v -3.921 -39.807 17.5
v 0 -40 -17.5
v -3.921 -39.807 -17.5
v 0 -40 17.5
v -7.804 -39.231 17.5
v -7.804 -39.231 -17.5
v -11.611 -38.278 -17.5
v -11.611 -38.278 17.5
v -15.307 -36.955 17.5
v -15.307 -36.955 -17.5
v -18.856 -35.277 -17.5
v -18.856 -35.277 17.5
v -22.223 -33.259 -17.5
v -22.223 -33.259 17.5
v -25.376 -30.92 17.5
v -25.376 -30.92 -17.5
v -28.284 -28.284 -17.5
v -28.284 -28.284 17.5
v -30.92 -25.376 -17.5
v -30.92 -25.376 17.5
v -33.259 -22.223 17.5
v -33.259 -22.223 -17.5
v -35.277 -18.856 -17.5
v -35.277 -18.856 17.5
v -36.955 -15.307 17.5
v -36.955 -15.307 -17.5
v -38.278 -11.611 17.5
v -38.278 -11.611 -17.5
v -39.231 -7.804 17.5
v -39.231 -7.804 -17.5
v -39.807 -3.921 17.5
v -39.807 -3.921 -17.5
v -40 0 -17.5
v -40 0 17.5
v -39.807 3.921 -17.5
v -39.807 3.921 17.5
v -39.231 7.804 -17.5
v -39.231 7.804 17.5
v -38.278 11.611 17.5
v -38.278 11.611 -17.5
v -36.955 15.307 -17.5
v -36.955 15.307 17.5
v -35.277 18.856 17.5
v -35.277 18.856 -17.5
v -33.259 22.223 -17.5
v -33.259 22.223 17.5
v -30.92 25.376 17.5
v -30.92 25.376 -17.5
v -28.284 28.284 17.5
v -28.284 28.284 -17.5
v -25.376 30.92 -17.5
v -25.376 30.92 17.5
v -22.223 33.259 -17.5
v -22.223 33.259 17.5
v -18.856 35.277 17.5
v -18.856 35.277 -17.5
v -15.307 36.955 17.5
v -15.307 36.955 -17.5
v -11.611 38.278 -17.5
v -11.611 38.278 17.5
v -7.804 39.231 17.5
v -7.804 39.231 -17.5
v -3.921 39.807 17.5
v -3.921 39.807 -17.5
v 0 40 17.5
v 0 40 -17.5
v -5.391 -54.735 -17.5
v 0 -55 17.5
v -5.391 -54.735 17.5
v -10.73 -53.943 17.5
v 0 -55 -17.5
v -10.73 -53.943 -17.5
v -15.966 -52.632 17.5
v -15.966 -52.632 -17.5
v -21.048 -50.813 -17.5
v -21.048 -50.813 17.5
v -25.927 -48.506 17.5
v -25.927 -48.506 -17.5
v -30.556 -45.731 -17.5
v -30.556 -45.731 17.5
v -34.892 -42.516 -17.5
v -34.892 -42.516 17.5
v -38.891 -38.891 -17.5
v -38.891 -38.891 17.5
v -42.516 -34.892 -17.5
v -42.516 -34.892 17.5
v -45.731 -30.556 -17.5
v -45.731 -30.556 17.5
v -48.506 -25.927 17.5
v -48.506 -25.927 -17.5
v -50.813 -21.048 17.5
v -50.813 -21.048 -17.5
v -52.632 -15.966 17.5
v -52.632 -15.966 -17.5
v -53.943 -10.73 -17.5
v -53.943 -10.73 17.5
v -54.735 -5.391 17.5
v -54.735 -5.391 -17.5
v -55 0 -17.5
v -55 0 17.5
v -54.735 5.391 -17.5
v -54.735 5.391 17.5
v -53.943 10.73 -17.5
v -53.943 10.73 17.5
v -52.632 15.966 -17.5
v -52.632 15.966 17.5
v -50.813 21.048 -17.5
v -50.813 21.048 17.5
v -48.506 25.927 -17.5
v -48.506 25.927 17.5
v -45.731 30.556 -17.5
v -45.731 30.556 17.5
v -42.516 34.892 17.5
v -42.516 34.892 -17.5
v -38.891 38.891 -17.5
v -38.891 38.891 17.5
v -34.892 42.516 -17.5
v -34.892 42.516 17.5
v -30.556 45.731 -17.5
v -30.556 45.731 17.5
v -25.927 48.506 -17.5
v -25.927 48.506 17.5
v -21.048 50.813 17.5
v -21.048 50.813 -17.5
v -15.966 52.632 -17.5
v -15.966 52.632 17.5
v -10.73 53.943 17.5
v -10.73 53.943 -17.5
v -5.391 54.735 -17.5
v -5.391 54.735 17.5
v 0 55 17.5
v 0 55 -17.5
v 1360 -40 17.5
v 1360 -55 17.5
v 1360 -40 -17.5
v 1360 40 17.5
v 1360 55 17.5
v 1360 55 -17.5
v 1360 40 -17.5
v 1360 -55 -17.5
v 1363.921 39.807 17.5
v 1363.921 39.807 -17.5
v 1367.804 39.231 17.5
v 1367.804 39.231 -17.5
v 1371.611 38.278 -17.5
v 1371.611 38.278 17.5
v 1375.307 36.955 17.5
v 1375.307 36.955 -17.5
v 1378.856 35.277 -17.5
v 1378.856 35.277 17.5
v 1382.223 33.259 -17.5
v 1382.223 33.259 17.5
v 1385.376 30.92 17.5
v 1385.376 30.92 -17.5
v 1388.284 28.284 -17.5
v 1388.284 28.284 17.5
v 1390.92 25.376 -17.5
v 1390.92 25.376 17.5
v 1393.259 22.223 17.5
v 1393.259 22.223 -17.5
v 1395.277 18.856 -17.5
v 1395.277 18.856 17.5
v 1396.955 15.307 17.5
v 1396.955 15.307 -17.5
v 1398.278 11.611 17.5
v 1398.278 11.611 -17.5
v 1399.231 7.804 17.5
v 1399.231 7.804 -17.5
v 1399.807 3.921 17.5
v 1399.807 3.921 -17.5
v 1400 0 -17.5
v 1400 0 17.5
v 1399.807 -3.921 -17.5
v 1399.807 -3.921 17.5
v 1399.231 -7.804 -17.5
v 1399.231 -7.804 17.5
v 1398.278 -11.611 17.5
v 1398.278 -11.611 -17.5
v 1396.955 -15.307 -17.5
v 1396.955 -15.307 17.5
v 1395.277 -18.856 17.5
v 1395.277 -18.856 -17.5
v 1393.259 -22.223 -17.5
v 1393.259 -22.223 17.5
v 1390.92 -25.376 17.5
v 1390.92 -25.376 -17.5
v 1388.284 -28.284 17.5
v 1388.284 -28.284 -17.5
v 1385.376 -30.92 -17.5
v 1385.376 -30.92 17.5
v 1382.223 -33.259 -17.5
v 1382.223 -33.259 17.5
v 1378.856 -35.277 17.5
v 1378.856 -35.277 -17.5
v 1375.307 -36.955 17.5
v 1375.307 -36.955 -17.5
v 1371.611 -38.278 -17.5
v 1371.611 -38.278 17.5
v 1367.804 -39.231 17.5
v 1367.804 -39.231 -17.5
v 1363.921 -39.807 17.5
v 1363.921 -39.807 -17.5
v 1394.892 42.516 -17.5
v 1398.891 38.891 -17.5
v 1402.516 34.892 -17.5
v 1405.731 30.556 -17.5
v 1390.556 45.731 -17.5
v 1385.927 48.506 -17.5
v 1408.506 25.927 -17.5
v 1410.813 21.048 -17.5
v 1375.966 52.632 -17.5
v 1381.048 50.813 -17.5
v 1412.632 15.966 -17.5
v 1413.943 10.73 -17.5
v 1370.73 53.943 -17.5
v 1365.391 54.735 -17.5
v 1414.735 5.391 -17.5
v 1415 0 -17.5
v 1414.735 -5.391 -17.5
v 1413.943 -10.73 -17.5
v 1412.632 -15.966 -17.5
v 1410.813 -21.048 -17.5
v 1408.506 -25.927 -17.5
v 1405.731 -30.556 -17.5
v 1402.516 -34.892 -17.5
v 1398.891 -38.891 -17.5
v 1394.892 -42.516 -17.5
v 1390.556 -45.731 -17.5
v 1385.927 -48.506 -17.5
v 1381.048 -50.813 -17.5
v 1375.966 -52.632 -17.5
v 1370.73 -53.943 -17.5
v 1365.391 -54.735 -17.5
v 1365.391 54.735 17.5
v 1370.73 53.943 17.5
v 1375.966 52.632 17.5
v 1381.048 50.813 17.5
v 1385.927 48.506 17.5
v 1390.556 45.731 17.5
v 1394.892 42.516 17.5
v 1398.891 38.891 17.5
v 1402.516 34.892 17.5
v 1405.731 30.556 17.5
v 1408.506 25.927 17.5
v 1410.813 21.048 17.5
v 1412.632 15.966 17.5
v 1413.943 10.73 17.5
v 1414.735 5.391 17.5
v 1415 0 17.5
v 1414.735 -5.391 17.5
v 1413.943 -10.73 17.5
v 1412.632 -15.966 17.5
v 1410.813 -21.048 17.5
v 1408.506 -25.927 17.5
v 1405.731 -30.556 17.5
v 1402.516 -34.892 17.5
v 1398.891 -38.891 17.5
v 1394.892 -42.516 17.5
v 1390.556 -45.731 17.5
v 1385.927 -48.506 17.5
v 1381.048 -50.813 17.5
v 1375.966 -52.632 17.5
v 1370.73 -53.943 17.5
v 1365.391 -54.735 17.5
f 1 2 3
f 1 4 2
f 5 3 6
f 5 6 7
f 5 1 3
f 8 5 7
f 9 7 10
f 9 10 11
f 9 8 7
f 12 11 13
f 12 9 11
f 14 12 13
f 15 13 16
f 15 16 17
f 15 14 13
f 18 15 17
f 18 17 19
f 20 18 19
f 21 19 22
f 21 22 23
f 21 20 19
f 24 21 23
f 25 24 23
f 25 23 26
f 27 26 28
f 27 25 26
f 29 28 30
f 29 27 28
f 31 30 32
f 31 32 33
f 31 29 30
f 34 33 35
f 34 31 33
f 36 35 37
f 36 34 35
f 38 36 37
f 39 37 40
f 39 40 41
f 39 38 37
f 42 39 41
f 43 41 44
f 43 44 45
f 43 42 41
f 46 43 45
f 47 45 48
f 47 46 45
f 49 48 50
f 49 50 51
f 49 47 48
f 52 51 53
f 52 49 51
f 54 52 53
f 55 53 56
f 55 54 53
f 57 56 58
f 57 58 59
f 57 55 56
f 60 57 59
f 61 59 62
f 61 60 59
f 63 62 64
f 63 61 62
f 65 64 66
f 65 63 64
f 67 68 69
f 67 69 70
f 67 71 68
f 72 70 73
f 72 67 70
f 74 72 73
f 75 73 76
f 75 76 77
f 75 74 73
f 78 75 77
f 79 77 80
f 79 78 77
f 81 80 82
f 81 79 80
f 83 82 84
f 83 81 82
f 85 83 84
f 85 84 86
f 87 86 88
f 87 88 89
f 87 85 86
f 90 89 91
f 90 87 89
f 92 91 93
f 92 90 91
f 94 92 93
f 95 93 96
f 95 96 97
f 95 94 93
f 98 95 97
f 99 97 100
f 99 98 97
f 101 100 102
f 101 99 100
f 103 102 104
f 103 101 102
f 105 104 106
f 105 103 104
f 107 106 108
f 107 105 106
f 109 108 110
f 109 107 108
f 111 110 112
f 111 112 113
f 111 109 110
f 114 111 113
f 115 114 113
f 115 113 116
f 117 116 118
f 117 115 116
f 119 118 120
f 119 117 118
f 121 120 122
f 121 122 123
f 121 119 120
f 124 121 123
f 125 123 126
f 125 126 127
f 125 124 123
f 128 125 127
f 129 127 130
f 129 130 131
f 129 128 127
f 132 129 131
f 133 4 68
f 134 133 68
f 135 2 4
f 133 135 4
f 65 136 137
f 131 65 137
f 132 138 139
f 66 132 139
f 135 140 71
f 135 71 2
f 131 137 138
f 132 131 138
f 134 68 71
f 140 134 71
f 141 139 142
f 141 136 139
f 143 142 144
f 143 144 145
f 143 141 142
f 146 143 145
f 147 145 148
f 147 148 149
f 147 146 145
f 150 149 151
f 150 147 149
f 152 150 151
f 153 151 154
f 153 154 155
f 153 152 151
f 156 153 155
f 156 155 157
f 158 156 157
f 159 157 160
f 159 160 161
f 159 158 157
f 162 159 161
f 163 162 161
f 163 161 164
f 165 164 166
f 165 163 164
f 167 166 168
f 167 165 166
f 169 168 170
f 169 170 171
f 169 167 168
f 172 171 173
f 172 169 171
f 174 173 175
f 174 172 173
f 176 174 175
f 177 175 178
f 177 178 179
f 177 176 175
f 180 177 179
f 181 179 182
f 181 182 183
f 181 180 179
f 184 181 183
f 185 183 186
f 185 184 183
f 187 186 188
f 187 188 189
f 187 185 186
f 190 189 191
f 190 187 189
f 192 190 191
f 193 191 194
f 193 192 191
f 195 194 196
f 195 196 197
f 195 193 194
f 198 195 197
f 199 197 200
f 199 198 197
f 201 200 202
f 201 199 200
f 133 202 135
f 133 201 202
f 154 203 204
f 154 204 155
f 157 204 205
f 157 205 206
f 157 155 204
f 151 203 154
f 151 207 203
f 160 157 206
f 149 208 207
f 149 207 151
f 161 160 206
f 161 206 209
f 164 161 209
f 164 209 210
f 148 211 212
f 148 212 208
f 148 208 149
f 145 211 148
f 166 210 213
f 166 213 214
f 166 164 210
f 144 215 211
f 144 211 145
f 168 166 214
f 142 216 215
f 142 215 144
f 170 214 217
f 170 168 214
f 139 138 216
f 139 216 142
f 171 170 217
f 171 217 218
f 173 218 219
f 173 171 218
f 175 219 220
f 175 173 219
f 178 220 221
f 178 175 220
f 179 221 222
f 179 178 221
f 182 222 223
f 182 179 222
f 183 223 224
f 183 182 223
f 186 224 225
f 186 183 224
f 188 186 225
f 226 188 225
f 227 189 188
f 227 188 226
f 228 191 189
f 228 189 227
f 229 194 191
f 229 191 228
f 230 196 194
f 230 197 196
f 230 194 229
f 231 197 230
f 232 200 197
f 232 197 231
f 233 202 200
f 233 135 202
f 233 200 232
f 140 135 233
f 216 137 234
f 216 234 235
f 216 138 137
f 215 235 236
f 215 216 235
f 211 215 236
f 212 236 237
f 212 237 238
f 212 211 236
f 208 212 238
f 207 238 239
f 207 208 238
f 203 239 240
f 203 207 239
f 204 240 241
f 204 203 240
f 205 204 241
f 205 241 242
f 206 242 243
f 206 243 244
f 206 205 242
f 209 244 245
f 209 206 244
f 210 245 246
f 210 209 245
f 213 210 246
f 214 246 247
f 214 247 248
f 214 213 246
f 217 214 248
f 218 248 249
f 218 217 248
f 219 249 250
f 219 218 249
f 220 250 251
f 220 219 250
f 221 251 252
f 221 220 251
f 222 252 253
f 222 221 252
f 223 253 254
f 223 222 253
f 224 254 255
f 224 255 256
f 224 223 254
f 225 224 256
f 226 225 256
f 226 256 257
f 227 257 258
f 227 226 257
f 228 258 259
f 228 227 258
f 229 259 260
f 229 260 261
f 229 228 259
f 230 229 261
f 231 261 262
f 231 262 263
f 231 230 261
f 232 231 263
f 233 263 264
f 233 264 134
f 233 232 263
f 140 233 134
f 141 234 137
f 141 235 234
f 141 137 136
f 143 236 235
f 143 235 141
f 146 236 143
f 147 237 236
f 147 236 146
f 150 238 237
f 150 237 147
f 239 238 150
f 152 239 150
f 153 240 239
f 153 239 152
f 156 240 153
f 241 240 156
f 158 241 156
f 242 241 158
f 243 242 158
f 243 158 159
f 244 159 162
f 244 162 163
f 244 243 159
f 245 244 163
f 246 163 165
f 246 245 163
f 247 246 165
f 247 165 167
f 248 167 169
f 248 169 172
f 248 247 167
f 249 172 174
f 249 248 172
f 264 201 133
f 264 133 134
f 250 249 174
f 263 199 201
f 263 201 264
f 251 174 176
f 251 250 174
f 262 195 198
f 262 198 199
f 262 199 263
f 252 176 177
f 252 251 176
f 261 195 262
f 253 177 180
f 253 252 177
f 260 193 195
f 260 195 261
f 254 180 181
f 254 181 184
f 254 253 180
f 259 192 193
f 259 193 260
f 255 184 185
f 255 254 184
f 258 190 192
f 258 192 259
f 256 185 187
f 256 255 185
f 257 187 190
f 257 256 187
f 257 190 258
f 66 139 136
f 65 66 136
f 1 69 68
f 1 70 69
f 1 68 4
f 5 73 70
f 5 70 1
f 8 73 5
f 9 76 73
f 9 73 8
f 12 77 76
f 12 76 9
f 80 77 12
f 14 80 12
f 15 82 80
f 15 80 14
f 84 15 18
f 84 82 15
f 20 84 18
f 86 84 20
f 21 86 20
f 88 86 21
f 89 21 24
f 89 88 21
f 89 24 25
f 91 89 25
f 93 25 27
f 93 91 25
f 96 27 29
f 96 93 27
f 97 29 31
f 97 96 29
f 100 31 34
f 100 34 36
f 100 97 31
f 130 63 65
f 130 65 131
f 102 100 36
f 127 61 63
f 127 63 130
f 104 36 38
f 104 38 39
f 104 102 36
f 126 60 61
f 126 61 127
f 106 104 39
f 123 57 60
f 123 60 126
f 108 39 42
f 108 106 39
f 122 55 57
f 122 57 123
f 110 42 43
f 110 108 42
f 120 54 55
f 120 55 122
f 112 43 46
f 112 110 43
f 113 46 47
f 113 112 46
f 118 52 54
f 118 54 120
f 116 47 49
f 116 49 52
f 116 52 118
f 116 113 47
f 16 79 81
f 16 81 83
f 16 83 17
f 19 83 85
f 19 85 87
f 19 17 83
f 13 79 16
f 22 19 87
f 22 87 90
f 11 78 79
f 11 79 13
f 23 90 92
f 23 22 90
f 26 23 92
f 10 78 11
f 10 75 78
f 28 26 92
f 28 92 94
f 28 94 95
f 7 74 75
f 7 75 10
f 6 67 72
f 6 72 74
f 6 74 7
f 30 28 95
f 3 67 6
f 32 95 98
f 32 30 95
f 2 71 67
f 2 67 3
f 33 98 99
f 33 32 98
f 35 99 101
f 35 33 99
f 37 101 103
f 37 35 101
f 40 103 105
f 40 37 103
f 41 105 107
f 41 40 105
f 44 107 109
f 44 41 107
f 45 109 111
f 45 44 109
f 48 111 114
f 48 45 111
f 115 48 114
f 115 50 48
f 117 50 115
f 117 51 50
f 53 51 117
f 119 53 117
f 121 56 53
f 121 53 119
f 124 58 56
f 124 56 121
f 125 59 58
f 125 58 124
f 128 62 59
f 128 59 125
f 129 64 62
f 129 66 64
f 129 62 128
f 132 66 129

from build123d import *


with BuildPart() as part:
    # Austragung1: sweep along a path in Skizze2
    with BuildLine(Plane.XY) as austragung1_path:
        Line((0, 40), (1360, 40))
        ThreePointArc((1360, 40), (1400, 0), (1360, -40))
        Line((1360, -40), (0, -40))
        ThreePointArc((0, -40), (-40, 0), (0, 40))
    # 3D-Skizze1 → Austragung1 (sweep)
    with BuildSketch(Plane(origin=(1360, 55, -17.5), x_dir=(0, -0.39391929857916763, 0.9191450300180579), z_dir=(-1, 0, 0))):
        Polygon((0, 0), (32.170076051, 13.78717545), (38.078865529, 0), (5.908789479, -13.78717545), align=None)
    sweep(path=austragung1_path.line)


solid = part.part
